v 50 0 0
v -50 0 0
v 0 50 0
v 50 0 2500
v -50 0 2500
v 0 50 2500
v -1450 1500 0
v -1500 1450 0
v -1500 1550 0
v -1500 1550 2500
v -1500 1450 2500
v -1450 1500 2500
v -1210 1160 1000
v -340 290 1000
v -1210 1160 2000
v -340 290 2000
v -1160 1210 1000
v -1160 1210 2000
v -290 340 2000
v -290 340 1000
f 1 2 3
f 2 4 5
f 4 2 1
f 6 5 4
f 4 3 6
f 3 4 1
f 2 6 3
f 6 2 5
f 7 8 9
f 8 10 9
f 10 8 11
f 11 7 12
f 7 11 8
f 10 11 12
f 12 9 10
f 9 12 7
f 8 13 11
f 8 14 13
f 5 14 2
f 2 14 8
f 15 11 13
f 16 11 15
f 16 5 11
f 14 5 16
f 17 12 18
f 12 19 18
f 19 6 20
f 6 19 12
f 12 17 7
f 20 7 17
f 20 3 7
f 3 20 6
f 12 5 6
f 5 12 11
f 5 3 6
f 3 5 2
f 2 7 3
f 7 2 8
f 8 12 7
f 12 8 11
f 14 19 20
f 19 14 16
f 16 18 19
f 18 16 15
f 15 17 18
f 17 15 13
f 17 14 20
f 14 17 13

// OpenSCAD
// file: templates/basic-dims.scad
unit = 1000;

section_width = unit * 1.5;
section_height = unit * 2.5;
section_thickness = unit * 0.1;

rt = sqrt(2);

//  -- Notes --
//  Z is UP
//  X is FORWARD (out of the screen)
// file: modifiers/diagonalize.scad
include <../templates/basic-dims.scad>

module diagonalize_triangle_sketch(t = section_thickness) {
    x = sin(45) * t;
    y = cos(45) * t;

    polygon([
        [0, y],
        [x, 0],
        [0, -y]
    ]);
}

module diagonalize_triangle(t = section_thickness) {
    rotate([0, 0, 90])
    linear_extrude(section_height)
    diagonalize_triangle_sketch(t);
}

module diagonalize2D() {
    thickness = section_thickness / rt;

    trans = (section_thickness/2)*rt/2;
    len_scale = rt - section_thickness / (rt * section_width);

    rotate([0, 0, 45])
    translate([trans, 0, 0])
    scale([len_scale, 1/rt, 1])
    children();
}


module diagonalize3D(w = section_width, t = section_thickness, edges = "trans") {

    trans = (t/2)*rt/2;
    len_scale = rt - t / (rt * w);

    edge_angle = edges == "cis" ? 270 : 180;
    
    diagonalize_triangle(t/rt);

    translate([-w, w, 0])
    rotate([0, 0, edge_angle]) // 180 For continue, -90 (270) for end
    diagonalize_triangle(t/rt);

    rotate([0, 0, 45])
    translate([0, trans, 0])
    scale([1/rt, len_scale, 1])
    children();
}
// file: templates/t_simple-window.scad
include <../templates/basic-dims.scad>

window_width = 0.6 * section_width;
window_height = 0.4 * section_height;
bottom_offset = 0.4 * section_height;

module simple_window_sketch() {
    difference() {
        square([section_width, section_height]);

        translate([
            section_width/2 - window_width/2,
            bottom_offset,
            0])
        square([window_width, window_height]);
    }
}

module simple_window() {
    rotate([90, 0, 90])
    translate([0, 0, -section_thickness/2])
    linear_extrude(section_thickness)
    simple_window_sketch();
}
// main file
include <./templates/t_simple-window.scad>
include <./modifiers/diagonalize.scad>

diagonalize3D(edges="cis")
simple_window();
